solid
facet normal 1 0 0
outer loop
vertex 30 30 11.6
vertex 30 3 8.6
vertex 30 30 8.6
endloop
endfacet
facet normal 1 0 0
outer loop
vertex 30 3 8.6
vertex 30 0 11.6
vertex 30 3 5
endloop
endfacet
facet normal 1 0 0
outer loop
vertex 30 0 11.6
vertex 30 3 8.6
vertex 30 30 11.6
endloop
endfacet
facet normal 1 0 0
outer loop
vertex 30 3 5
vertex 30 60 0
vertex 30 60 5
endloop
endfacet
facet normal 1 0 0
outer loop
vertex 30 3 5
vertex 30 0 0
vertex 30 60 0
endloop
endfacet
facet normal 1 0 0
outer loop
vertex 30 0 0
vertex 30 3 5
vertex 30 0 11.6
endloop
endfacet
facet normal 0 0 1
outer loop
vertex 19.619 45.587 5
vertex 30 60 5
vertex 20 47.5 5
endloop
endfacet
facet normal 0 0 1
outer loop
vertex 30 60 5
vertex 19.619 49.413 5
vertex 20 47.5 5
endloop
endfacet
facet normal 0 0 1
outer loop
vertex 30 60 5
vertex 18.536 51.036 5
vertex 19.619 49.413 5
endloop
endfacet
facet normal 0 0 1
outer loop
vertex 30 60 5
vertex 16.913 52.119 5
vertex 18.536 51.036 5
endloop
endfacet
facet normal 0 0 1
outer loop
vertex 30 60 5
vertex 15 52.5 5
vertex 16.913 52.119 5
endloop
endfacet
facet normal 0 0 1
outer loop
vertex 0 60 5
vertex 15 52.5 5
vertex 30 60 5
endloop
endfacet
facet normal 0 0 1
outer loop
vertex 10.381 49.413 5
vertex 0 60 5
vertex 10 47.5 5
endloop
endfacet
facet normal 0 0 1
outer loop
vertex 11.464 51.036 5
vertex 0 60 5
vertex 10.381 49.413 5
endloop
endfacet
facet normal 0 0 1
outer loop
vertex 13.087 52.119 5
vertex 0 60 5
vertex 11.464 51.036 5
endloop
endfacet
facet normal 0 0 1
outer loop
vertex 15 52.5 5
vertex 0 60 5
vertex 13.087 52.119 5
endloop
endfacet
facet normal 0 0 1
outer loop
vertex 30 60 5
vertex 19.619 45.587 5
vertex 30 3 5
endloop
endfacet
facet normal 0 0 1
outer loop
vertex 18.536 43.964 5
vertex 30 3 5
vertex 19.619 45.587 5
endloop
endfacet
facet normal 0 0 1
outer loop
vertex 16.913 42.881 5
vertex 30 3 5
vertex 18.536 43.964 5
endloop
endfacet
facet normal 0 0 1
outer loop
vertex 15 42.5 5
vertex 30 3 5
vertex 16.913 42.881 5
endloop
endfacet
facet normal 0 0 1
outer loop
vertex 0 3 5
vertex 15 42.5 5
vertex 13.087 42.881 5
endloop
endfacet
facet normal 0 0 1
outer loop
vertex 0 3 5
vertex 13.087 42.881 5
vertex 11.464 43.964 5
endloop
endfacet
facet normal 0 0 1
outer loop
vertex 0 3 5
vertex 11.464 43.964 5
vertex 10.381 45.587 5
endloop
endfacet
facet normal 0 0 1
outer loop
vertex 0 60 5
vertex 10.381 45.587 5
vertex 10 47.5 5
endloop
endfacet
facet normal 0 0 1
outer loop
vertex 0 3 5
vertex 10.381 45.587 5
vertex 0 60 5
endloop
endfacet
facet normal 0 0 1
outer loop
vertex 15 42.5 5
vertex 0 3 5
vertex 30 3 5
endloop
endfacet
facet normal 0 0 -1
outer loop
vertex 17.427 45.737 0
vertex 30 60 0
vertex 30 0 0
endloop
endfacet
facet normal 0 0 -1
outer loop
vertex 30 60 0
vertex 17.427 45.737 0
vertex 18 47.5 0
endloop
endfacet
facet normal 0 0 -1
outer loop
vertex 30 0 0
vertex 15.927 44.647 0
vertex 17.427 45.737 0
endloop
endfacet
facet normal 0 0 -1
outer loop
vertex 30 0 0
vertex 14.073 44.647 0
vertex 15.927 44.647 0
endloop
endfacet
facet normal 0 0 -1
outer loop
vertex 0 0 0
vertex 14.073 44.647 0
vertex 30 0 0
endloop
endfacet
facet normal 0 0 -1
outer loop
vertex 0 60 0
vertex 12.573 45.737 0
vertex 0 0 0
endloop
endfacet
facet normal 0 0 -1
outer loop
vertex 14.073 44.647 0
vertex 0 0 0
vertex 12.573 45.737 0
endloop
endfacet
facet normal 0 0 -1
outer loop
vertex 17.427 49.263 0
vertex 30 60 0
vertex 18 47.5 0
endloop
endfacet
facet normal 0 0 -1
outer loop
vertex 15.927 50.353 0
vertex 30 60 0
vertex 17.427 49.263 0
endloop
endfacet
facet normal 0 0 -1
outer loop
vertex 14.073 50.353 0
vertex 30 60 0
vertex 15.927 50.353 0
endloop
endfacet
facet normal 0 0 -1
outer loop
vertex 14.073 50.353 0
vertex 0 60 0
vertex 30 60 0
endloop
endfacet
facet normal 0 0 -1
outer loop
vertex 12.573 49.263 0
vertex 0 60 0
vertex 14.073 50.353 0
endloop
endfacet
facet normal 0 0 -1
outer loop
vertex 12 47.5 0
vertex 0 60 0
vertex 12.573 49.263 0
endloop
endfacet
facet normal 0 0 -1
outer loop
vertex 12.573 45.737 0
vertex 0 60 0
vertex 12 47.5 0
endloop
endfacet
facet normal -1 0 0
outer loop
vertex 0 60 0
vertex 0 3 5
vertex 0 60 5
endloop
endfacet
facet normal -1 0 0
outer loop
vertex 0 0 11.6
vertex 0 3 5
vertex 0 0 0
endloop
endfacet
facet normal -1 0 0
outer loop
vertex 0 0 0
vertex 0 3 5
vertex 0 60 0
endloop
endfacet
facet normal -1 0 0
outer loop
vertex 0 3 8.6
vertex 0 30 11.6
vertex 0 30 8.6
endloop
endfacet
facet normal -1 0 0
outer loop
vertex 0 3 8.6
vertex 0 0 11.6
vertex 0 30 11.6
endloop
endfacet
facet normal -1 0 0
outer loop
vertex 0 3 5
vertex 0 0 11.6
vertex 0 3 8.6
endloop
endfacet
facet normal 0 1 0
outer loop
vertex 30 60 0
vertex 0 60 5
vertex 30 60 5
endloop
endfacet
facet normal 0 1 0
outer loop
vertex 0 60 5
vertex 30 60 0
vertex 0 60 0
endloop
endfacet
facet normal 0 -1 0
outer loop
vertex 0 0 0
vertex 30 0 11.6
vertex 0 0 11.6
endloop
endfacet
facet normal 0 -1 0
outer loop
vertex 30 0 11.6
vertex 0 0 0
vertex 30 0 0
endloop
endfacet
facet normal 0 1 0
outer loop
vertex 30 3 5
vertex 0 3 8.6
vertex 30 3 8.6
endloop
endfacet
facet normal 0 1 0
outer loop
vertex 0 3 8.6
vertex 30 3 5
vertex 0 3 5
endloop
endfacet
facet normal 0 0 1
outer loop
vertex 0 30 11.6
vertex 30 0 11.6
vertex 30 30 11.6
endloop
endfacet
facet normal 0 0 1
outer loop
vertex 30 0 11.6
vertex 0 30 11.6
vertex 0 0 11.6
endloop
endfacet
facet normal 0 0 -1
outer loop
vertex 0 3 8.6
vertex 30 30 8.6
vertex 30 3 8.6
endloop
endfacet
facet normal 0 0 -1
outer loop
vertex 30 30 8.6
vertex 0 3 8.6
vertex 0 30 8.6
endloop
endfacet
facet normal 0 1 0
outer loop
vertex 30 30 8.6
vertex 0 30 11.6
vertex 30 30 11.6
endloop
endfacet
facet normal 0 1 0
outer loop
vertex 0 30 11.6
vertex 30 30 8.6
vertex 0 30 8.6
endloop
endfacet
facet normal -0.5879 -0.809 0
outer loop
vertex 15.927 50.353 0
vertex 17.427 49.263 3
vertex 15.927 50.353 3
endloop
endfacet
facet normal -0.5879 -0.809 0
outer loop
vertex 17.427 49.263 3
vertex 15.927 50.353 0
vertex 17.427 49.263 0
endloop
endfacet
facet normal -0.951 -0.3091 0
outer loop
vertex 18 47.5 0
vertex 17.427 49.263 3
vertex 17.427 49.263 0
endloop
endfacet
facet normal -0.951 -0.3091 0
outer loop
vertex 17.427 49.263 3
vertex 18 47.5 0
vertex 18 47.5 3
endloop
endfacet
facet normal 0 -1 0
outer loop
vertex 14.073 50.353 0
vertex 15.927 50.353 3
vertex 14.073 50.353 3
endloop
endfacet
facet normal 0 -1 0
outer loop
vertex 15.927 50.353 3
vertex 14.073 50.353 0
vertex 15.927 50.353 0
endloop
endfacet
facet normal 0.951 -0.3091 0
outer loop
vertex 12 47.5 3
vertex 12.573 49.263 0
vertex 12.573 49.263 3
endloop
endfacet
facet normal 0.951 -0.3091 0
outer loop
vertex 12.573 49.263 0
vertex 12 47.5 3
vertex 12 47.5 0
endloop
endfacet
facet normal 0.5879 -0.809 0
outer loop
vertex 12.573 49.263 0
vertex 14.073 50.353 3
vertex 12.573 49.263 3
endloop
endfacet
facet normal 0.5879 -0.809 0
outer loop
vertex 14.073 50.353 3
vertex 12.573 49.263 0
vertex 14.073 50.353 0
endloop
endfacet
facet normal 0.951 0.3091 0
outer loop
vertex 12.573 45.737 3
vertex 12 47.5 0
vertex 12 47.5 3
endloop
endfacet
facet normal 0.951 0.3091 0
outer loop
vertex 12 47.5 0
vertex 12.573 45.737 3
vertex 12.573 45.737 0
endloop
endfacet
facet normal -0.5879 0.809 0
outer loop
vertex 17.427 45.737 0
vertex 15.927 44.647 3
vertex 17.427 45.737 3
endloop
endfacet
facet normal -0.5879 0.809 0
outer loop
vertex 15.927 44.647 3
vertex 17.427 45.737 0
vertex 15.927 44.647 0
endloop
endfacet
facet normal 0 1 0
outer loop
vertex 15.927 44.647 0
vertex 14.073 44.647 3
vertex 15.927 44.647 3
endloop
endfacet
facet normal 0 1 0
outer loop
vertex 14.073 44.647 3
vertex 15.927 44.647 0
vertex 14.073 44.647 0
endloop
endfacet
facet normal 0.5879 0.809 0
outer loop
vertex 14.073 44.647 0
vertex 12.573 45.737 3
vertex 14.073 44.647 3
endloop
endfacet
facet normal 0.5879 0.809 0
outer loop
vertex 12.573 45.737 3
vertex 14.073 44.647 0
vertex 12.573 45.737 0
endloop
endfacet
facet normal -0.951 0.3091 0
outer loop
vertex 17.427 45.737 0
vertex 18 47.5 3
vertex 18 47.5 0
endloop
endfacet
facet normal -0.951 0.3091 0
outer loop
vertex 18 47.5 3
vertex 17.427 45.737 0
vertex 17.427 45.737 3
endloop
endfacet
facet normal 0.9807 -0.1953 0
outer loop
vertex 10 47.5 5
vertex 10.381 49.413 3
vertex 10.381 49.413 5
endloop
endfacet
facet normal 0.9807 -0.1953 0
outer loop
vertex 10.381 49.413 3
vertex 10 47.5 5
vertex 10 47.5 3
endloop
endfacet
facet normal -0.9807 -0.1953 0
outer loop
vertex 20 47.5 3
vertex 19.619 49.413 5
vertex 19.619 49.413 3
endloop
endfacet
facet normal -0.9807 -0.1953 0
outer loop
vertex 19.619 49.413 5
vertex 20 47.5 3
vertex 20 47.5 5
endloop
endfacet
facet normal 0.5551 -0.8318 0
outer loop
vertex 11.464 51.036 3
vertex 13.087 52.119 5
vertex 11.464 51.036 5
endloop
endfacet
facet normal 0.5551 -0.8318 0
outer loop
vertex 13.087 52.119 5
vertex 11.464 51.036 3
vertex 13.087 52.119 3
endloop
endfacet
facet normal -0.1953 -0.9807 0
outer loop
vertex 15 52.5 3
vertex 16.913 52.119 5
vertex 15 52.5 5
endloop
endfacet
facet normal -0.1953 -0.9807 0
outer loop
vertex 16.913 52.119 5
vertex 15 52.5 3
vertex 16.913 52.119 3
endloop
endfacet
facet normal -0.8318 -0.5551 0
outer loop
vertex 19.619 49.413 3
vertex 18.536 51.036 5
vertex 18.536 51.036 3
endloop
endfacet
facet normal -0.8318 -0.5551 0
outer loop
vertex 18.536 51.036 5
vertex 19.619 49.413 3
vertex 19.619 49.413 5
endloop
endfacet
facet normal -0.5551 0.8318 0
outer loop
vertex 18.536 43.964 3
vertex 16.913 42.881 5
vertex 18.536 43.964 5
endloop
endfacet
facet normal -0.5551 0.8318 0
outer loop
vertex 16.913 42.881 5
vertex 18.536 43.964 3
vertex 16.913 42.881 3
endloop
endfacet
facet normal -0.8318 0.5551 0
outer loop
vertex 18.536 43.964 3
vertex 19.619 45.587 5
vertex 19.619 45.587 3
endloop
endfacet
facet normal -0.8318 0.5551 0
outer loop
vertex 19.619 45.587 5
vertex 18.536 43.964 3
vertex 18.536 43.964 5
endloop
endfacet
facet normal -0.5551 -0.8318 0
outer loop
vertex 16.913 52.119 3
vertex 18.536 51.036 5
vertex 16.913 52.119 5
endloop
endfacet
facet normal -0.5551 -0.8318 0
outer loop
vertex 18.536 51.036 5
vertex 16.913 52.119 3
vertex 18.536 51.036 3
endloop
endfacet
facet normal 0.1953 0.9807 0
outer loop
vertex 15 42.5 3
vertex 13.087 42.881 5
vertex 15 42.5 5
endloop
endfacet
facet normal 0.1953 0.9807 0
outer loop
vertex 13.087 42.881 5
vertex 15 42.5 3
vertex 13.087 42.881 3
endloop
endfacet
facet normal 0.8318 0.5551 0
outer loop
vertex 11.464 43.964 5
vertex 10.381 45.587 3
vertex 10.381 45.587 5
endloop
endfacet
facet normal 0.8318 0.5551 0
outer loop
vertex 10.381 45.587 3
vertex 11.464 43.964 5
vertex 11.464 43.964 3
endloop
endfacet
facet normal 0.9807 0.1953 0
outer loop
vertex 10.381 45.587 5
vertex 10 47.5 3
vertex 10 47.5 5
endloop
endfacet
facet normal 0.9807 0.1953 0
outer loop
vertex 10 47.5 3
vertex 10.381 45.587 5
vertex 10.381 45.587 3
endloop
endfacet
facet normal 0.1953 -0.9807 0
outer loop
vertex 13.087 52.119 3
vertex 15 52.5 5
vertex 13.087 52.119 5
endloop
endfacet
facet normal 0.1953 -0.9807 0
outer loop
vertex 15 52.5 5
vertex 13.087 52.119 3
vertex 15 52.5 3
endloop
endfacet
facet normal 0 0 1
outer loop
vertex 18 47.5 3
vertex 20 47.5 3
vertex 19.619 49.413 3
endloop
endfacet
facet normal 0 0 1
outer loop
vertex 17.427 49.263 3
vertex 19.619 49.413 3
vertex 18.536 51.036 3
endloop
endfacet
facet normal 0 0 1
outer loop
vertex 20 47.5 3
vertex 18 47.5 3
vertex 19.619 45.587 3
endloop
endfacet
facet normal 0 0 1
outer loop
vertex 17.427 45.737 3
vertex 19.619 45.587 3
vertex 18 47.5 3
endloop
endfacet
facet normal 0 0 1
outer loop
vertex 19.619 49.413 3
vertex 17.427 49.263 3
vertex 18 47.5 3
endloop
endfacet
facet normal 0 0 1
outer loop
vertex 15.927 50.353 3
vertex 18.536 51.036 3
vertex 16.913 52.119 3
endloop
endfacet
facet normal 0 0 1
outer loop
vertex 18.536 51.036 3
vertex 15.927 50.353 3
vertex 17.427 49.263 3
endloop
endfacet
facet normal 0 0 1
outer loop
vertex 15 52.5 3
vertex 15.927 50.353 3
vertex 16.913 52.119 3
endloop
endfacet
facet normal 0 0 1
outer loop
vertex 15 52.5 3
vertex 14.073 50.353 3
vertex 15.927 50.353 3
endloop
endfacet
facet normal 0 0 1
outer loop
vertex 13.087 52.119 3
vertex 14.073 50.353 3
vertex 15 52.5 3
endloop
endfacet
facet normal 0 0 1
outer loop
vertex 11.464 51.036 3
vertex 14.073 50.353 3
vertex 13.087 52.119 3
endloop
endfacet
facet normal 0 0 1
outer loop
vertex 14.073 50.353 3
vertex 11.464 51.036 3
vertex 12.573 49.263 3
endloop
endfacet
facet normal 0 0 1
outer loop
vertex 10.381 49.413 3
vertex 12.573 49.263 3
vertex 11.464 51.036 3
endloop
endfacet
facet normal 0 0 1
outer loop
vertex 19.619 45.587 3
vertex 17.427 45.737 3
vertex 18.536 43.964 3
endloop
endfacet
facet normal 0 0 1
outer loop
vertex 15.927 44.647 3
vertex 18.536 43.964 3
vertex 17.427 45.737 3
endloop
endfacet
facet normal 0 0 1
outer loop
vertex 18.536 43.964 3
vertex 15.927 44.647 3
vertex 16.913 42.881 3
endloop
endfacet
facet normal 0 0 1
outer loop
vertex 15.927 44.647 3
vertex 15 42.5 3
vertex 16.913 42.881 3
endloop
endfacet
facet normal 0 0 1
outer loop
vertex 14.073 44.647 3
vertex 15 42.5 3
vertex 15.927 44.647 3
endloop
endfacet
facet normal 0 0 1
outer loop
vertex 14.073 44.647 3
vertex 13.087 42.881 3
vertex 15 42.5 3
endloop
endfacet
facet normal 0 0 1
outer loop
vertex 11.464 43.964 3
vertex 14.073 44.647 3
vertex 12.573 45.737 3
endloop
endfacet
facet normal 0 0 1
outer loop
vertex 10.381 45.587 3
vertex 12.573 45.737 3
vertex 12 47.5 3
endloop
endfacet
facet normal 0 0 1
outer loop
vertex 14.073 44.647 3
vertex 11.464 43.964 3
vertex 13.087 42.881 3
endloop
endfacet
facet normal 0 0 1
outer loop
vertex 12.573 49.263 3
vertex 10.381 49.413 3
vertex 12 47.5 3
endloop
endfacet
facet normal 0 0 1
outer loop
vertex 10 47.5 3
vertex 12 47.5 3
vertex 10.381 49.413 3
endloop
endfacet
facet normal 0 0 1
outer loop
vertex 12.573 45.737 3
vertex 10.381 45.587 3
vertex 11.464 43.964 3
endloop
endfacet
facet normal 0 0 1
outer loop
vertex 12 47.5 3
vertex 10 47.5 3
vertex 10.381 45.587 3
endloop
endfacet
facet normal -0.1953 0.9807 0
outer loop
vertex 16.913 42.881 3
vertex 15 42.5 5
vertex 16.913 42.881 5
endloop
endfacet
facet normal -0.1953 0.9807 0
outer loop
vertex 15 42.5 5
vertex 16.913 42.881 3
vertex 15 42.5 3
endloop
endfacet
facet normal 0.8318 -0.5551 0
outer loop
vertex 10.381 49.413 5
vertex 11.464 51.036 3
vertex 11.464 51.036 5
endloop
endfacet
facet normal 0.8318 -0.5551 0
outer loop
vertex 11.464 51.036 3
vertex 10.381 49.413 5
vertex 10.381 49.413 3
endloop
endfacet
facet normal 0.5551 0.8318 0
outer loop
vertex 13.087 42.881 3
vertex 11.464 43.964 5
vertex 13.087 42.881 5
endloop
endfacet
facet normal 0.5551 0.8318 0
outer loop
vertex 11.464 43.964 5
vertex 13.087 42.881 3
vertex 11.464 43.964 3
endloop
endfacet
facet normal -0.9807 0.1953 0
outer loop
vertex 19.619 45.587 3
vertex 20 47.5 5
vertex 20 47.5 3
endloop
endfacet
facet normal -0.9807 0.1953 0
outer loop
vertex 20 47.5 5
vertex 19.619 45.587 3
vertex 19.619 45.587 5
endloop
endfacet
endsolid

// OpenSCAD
bottom = 60;
size = 30;
thick = 5;
slot = 5.6;
hole = 3;
bot_thick = 5;
mid_thick = 3;
top_thick = 3;

difference() {
    union () {
        cube([size,bottom,bot_thick]);
        translate([0,0,bot_thick]) cube([size,mid_thick,slot]);
        translate([0,0,mid_thick+slot]) cube([size,size,top_thick]);
    }
    translate([size/2,bottom-((size-bot_thick)/2),0]) cylinder(bot_thick,hole,hole);
    translate([size/2,bottom-((size-bot_thick)/2),bot_thick-2]) cylinder(bot_thick,hole+2,hole+2);    
}
